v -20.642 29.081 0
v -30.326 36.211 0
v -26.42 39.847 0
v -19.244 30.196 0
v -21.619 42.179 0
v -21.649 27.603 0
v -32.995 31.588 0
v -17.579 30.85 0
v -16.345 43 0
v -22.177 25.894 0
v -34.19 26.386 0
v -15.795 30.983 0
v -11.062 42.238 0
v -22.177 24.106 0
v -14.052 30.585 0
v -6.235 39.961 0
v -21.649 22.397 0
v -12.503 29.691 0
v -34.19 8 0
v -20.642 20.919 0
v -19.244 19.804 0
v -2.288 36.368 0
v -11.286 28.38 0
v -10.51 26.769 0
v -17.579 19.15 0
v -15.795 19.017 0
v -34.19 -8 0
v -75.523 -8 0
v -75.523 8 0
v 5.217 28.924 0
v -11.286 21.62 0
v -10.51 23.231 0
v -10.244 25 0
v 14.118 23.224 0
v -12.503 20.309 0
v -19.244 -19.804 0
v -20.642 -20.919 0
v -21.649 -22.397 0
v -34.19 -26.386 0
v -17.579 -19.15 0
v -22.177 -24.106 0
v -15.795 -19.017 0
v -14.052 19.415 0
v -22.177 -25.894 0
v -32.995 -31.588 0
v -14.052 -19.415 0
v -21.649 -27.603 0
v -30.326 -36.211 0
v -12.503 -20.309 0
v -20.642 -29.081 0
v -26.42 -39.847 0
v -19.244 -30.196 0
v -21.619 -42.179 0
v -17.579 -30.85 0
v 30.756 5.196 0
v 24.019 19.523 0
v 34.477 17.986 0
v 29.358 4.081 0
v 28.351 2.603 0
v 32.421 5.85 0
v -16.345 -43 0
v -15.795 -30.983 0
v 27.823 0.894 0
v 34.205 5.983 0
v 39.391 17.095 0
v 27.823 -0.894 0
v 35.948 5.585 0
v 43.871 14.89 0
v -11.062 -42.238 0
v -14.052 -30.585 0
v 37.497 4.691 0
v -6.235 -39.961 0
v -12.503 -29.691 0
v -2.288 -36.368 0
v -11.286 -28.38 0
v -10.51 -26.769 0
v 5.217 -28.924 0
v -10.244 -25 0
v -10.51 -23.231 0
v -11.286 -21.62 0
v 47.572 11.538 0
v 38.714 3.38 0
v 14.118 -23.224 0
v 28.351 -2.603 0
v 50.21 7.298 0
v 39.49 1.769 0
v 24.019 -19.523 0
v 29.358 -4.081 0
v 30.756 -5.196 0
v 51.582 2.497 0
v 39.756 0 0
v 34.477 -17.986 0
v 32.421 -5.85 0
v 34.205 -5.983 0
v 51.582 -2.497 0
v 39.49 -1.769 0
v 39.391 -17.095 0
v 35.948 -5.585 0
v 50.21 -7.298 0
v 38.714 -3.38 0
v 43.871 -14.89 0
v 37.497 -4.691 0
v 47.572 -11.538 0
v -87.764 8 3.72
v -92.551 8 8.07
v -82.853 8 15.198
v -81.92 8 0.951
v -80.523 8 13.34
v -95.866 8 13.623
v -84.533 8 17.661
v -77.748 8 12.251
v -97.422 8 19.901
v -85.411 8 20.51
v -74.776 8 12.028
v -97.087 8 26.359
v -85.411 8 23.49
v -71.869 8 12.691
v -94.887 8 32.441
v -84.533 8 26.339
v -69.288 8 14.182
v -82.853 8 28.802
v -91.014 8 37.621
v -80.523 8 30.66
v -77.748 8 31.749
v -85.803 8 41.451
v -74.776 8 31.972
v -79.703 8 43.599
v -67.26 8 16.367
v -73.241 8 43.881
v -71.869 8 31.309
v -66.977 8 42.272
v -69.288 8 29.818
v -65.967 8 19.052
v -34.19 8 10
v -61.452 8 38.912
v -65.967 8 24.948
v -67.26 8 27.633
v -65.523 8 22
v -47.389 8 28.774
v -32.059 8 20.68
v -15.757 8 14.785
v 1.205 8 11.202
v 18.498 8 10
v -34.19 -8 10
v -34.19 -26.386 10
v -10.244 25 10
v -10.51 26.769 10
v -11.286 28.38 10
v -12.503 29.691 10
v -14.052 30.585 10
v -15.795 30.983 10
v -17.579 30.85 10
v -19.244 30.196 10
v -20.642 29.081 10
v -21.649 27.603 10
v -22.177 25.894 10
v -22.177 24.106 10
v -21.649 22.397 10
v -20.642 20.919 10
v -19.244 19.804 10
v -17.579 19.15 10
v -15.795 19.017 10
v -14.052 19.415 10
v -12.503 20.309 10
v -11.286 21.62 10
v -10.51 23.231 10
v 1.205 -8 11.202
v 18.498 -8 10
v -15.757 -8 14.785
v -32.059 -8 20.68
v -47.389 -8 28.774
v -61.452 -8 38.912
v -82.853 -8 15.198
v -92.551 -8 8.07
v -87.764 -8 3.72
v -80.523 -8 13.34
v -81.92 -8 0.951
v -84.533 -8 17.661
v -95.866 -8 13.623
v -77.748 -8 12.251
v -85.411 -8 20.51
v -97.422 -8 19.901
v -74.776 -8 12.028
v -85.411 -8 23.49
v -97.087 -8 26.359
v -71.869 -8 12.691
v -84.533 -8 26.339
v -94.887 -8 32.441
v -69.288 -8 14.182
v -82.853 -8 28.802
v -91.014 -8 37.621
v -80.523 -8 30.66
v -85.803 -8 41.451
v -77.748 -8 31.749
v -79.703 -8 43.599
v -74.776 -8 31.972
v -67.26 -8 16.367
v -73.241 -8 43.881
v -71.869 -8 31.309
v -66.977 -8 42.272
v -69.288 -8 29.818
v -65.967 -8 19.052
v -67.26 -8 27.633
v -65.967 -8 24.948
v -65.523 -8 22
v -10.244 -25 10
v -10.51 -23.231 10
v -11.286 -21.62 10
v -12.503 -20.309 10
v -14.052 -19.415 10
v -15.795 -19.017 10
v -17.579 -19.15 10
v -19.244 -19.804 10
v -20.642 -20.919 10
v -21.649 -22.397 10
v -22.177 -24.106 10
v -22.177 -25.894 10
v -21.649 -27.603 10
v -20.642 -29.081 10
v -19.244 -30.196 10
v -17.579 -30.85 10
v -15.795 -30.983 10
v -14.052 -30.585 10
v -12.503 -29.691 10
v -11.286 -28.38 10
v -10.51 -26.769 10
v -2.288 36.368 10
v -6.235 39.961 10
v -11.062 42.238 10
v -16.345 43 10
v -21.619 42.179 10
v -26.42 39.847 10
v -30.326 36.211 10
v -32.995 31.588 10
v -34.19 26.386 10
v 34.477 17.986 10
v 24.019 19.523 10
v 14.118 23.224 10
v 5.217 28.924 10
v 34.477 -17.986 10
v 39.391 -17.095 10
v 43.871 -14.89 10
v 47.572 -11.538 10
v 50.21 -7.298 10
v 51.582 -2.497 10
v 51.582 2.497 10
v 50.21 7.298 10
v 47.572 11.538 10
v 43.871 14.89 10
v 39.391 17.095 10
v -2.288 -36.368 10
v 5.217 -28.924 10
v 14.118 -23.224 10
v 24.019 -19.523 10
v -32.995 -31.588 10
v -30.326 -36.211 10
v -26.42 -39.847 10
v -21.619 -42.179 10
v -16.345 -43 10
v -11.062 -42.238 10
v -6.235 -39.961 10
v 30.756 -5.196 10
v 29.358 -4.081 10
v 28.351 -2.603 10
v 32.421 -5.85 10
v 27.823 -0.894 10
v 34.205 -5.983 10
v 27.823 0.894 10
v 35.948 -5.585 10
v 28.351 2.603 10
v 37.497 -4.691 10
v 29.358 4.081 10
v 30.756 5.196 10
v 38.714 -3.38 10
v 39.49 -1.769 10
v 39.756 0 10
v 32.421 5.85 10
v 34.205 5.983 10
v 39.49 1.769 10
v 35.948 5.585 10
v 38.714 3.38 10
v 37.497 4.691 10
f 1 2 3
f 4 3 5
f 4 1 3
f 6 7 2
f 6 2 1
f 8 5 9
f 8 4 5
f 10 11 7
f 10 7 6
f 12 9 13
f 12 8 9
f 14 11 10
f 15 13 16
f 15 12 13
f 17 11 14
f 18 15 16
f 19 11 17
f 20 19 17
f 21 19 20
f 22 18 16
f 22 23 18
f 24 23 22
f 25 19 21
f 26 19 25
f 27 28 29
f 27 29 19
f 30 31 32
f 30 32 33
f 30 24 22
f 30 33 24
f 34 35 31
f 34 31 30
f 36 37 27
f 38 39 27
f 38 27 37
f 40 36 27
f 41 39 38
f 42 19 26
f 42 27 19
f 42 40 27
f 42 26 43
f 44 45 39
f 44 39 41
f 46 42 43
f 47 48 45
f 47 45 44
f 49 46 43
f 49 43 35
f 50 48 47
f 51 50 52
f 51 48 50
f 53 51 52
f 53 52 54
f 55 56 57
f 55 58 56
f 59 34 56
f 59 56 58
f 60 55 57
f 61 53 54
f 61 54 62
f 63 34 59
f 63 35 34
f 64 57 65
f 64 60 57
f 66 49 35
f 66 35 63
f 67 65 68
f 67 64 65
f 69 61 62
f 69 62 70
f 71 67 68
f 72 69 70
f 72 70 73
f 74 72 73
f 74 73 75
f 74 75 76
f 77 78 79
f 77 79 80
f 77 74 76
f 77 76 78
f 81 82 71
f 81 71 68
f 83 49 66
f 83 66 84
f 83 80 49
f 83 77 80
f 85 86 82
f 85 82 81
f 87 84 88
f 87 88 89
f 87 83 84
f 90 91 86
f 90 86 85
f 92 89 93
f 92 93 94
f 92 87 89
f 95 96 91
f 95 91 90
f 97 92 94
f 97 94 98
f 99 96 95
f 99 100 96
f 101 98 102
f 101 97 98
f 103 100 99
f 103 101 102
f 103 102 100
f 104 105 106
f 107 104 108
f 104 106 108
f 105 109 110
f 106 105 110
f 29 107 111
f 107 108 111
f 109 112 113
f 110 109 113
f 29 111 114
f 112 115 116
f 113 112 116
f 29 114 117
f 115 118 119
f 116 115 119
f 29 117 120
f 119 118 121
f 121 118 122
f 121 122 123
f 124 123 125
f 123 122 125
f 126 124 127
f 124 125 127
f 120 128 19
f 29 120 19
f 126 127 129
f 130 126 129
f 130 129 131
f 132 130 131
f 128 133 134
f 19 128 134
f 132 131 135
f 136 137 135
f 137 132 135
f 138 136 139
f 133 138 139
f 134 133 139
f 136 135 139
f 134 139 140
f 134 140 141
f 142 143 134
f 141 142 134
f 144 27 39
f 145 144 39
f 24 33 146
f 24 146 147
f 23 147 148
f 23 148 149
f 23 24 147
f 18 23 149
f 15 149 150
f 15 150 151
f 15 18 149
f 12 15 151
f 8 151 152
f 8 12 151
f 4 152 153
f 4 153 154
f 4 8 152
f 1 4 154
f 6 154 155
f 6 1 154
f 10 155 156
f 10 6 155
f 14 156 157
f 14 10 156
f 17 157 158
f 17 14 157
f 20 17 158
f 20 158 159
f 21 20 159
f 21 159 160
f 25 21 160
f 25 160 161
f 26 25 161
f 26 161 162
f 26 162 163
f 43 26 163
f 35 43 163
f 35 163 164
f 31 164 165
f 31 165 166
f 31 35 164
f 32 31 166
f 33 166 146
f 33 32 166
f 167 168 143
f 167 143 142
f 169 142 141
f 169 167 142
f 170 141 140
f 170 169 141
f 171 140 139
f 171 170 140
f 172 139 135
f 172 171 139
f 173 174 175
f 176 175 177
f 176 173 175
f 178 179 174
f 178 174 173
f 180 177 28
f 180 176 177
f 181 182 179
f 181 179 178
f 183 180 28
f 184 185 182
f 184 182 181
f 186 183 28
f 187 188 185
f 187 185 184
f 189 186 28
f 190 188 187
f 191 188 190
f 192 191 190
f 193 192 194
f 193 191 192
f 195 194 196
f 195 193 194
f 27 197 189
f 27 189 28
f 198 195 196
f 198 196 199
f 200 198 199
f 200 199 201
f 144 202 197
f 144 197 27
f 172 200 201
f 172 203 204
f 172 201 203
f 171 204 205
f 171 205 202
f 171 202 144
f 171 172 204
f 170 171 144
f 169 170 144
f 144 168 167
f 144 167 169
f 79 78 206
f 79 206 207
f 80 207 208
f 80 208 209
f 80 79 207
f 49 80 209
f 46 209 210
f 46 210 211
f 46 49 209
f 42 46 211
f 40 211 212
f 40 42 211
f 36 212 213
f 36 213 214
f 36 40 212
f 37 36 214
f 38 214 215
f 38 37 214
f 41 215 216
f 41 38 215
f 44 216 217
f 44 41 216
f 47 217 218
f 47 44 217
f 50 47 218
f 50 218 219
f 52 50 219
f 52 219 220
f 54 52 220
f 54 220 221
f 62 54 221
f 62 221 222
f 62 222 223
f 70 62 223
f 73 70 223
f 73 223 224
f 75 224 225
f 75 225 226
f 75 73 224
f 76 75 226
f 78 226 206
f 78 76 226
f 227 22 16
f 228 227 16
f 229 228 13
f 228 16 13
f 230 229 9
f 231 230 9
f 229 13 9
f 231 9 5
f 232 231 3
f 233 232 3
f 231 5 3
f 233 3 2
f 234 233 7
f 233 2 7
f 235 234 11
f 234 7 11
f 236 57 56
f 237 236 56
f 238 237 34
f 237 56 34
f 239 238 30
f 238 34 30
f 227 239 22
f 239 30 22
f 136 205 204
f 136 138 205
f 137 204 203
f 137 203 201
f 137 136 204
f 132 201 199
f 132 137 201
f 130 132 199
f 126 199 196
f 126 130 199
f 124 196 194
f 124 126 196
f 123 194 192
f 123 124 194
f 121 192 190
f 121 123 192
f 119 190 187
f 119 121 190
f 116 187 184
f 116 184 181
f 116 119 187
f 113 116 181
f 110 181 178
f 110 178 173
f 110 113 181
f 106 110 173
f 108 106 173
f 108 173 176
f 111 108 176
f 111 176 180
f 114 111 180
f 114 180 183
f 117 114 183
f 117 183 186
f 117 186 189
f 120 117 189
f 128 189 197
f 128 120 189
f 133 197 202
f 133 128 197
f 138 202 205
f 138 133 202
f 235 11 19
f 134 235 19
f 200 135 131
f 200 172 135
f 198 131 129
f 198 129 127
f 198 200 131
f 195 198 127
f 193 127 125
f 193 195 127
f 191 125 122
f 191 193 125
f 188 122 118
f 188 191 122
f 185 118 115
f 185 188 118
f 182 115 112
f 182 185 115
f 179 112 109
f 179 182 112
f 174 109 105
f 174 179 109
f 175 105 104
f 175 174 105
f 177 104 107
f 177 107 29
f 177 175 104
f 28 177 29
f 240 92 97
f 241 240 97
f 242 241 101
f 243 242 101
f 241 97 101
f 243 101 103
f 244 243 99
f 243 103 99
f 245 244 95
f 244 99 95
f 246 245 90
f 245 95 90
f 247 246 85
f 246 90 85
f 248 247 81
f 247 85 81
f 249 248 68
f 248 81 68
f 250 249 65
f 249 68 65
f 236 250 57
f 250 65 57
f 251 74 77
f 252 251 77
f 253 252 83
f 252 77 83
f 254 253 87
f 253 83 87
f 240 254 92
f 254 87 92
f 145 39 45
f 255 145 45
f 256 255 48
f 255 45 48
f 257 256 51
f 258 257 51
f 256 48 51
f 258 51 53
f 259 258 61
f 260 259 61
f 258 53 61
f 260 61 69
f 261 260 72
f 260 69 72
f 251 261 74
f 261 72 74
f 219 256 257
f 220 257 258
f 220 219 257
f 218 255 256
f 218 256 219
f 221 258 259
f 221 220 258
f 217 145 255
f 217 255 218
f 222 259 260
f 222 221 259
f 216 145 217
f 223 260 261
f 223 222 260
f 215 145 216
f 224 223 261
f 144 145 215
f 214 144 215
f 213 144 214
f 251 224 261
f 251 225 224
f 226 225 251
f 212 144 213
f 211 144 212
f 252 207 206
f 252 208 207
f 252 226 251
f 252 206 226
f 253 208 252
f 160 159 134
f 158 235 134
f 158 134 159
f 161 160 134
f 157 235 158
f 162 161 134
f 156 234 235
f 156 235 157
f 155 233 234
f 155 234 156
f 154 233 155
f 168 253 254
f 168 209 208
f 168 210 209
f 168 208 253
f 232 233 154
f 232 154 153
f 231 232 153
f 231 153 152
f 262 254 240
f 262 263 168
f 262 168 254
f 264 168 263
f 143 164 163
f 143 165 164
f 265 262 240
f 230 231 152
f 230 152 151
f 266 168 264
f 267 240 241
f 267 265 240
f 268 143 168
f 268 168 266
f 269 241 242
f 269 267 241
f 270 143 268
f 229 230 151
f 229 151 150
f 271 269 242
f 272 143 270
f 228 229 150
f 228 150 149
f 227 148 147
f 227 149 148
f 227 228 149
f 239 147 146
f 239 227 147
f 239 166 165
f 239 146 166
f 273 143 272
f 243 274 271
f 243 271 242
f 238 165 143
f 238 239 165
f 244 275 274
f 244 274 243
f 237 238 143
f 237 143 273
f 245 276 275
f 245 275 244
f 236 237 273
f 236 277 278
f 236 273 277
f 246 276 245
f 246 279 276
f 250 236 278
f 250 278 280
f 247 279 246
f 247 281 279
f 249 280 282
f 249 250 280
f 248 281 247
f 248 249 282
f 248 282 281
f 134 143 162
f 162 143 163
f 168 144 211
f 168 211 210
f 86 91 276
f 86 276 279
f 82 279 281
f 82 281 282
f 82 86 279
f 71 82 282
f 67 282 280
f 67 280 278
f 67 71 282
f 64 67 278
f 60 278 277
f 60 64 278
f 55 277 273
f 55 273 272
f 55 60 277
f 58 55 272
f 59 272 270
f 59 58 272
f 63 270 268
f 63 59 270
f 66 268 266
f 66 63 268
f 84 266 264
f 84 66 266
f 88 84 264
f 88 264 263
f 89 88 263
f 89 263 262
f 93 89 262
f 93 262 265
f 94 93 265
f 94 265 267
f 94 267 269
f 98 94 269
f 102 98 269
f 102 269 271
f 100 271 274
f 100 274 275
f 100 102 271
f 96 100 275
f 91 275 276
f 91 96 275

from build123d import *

# Parameters (mm, degrees)
F0_R     = 6
F1_DEPTH = 10
F2_R     = 10
F3_DEPTH = 8


with BuildPart() as f1:
    # F0 (on Top) → F1 (new body)
    with BuildSketch(Plane.XY):
        with BuildLine():
            ThreePointArc((-2.287583, -36.367918), (14.118454, -23.224109), (34.477123, -17.985565))
            ThreePointArc((34.477123, -17.985565), (51.756399, 0), (34.477123, 17.985565))
            ThreePointArc((34.477123, 17.985565), (14.118454, 23.224109), (-2.287583, 36.367918))
            ThreePointArc((-2.287583, 36.367918), (-21.61854, 42.178767), (-34.190148, 26.386157))
            Line((-34.190148, 26.386157), (-34.190148, 23.613843))
            Line((-34.190148, 23.613843), (-34.190148, -23.613843))
            Line((-34.190148, -23.613843), (-34.190148, -26.386157))
            ThreePointArc((-34.190148, -26.386157), (-21.61854, -42.178767), (-2.287583, -36.367918))
        make_face()
        with Locations((-16.243601, -25)):
            Circle(F0_R, mode=Mode.SUBTRACT)
        with Locations((33.756399, 0)):
            Circle(F0_R, mode=Mode.SUBTRACT)
        with Locations((-16.243601, 25)):
            Circle(F0_R, mode=Mode.SUBTRACT)
    extrude(amount=F1_DEPTH)

    # F2 (on Front) → F3 (join, symmetric)
    with BuildSketch(Plane.XZ):
        with BuildLine():
            Line((-75.522877, 0), (18.498397, 0))
            Line((18.498397, 0), (18.498397, 10))
            ThreePointArc((18.498397, 10), (-24.010105, 17.449895), (-61.451666, 38.911565))
            ThreePointArc((-61.451666, 38.911565), (-96.211695, 29.481496), (-75.522877, 0))
        make_face()
        with Locations((-75.522877, 22)):
            Circle(F2_R, mode=Mode.SUBTRACT)
    extrude(amount=F3_DEPTH, both=True)


solid = f1.part
